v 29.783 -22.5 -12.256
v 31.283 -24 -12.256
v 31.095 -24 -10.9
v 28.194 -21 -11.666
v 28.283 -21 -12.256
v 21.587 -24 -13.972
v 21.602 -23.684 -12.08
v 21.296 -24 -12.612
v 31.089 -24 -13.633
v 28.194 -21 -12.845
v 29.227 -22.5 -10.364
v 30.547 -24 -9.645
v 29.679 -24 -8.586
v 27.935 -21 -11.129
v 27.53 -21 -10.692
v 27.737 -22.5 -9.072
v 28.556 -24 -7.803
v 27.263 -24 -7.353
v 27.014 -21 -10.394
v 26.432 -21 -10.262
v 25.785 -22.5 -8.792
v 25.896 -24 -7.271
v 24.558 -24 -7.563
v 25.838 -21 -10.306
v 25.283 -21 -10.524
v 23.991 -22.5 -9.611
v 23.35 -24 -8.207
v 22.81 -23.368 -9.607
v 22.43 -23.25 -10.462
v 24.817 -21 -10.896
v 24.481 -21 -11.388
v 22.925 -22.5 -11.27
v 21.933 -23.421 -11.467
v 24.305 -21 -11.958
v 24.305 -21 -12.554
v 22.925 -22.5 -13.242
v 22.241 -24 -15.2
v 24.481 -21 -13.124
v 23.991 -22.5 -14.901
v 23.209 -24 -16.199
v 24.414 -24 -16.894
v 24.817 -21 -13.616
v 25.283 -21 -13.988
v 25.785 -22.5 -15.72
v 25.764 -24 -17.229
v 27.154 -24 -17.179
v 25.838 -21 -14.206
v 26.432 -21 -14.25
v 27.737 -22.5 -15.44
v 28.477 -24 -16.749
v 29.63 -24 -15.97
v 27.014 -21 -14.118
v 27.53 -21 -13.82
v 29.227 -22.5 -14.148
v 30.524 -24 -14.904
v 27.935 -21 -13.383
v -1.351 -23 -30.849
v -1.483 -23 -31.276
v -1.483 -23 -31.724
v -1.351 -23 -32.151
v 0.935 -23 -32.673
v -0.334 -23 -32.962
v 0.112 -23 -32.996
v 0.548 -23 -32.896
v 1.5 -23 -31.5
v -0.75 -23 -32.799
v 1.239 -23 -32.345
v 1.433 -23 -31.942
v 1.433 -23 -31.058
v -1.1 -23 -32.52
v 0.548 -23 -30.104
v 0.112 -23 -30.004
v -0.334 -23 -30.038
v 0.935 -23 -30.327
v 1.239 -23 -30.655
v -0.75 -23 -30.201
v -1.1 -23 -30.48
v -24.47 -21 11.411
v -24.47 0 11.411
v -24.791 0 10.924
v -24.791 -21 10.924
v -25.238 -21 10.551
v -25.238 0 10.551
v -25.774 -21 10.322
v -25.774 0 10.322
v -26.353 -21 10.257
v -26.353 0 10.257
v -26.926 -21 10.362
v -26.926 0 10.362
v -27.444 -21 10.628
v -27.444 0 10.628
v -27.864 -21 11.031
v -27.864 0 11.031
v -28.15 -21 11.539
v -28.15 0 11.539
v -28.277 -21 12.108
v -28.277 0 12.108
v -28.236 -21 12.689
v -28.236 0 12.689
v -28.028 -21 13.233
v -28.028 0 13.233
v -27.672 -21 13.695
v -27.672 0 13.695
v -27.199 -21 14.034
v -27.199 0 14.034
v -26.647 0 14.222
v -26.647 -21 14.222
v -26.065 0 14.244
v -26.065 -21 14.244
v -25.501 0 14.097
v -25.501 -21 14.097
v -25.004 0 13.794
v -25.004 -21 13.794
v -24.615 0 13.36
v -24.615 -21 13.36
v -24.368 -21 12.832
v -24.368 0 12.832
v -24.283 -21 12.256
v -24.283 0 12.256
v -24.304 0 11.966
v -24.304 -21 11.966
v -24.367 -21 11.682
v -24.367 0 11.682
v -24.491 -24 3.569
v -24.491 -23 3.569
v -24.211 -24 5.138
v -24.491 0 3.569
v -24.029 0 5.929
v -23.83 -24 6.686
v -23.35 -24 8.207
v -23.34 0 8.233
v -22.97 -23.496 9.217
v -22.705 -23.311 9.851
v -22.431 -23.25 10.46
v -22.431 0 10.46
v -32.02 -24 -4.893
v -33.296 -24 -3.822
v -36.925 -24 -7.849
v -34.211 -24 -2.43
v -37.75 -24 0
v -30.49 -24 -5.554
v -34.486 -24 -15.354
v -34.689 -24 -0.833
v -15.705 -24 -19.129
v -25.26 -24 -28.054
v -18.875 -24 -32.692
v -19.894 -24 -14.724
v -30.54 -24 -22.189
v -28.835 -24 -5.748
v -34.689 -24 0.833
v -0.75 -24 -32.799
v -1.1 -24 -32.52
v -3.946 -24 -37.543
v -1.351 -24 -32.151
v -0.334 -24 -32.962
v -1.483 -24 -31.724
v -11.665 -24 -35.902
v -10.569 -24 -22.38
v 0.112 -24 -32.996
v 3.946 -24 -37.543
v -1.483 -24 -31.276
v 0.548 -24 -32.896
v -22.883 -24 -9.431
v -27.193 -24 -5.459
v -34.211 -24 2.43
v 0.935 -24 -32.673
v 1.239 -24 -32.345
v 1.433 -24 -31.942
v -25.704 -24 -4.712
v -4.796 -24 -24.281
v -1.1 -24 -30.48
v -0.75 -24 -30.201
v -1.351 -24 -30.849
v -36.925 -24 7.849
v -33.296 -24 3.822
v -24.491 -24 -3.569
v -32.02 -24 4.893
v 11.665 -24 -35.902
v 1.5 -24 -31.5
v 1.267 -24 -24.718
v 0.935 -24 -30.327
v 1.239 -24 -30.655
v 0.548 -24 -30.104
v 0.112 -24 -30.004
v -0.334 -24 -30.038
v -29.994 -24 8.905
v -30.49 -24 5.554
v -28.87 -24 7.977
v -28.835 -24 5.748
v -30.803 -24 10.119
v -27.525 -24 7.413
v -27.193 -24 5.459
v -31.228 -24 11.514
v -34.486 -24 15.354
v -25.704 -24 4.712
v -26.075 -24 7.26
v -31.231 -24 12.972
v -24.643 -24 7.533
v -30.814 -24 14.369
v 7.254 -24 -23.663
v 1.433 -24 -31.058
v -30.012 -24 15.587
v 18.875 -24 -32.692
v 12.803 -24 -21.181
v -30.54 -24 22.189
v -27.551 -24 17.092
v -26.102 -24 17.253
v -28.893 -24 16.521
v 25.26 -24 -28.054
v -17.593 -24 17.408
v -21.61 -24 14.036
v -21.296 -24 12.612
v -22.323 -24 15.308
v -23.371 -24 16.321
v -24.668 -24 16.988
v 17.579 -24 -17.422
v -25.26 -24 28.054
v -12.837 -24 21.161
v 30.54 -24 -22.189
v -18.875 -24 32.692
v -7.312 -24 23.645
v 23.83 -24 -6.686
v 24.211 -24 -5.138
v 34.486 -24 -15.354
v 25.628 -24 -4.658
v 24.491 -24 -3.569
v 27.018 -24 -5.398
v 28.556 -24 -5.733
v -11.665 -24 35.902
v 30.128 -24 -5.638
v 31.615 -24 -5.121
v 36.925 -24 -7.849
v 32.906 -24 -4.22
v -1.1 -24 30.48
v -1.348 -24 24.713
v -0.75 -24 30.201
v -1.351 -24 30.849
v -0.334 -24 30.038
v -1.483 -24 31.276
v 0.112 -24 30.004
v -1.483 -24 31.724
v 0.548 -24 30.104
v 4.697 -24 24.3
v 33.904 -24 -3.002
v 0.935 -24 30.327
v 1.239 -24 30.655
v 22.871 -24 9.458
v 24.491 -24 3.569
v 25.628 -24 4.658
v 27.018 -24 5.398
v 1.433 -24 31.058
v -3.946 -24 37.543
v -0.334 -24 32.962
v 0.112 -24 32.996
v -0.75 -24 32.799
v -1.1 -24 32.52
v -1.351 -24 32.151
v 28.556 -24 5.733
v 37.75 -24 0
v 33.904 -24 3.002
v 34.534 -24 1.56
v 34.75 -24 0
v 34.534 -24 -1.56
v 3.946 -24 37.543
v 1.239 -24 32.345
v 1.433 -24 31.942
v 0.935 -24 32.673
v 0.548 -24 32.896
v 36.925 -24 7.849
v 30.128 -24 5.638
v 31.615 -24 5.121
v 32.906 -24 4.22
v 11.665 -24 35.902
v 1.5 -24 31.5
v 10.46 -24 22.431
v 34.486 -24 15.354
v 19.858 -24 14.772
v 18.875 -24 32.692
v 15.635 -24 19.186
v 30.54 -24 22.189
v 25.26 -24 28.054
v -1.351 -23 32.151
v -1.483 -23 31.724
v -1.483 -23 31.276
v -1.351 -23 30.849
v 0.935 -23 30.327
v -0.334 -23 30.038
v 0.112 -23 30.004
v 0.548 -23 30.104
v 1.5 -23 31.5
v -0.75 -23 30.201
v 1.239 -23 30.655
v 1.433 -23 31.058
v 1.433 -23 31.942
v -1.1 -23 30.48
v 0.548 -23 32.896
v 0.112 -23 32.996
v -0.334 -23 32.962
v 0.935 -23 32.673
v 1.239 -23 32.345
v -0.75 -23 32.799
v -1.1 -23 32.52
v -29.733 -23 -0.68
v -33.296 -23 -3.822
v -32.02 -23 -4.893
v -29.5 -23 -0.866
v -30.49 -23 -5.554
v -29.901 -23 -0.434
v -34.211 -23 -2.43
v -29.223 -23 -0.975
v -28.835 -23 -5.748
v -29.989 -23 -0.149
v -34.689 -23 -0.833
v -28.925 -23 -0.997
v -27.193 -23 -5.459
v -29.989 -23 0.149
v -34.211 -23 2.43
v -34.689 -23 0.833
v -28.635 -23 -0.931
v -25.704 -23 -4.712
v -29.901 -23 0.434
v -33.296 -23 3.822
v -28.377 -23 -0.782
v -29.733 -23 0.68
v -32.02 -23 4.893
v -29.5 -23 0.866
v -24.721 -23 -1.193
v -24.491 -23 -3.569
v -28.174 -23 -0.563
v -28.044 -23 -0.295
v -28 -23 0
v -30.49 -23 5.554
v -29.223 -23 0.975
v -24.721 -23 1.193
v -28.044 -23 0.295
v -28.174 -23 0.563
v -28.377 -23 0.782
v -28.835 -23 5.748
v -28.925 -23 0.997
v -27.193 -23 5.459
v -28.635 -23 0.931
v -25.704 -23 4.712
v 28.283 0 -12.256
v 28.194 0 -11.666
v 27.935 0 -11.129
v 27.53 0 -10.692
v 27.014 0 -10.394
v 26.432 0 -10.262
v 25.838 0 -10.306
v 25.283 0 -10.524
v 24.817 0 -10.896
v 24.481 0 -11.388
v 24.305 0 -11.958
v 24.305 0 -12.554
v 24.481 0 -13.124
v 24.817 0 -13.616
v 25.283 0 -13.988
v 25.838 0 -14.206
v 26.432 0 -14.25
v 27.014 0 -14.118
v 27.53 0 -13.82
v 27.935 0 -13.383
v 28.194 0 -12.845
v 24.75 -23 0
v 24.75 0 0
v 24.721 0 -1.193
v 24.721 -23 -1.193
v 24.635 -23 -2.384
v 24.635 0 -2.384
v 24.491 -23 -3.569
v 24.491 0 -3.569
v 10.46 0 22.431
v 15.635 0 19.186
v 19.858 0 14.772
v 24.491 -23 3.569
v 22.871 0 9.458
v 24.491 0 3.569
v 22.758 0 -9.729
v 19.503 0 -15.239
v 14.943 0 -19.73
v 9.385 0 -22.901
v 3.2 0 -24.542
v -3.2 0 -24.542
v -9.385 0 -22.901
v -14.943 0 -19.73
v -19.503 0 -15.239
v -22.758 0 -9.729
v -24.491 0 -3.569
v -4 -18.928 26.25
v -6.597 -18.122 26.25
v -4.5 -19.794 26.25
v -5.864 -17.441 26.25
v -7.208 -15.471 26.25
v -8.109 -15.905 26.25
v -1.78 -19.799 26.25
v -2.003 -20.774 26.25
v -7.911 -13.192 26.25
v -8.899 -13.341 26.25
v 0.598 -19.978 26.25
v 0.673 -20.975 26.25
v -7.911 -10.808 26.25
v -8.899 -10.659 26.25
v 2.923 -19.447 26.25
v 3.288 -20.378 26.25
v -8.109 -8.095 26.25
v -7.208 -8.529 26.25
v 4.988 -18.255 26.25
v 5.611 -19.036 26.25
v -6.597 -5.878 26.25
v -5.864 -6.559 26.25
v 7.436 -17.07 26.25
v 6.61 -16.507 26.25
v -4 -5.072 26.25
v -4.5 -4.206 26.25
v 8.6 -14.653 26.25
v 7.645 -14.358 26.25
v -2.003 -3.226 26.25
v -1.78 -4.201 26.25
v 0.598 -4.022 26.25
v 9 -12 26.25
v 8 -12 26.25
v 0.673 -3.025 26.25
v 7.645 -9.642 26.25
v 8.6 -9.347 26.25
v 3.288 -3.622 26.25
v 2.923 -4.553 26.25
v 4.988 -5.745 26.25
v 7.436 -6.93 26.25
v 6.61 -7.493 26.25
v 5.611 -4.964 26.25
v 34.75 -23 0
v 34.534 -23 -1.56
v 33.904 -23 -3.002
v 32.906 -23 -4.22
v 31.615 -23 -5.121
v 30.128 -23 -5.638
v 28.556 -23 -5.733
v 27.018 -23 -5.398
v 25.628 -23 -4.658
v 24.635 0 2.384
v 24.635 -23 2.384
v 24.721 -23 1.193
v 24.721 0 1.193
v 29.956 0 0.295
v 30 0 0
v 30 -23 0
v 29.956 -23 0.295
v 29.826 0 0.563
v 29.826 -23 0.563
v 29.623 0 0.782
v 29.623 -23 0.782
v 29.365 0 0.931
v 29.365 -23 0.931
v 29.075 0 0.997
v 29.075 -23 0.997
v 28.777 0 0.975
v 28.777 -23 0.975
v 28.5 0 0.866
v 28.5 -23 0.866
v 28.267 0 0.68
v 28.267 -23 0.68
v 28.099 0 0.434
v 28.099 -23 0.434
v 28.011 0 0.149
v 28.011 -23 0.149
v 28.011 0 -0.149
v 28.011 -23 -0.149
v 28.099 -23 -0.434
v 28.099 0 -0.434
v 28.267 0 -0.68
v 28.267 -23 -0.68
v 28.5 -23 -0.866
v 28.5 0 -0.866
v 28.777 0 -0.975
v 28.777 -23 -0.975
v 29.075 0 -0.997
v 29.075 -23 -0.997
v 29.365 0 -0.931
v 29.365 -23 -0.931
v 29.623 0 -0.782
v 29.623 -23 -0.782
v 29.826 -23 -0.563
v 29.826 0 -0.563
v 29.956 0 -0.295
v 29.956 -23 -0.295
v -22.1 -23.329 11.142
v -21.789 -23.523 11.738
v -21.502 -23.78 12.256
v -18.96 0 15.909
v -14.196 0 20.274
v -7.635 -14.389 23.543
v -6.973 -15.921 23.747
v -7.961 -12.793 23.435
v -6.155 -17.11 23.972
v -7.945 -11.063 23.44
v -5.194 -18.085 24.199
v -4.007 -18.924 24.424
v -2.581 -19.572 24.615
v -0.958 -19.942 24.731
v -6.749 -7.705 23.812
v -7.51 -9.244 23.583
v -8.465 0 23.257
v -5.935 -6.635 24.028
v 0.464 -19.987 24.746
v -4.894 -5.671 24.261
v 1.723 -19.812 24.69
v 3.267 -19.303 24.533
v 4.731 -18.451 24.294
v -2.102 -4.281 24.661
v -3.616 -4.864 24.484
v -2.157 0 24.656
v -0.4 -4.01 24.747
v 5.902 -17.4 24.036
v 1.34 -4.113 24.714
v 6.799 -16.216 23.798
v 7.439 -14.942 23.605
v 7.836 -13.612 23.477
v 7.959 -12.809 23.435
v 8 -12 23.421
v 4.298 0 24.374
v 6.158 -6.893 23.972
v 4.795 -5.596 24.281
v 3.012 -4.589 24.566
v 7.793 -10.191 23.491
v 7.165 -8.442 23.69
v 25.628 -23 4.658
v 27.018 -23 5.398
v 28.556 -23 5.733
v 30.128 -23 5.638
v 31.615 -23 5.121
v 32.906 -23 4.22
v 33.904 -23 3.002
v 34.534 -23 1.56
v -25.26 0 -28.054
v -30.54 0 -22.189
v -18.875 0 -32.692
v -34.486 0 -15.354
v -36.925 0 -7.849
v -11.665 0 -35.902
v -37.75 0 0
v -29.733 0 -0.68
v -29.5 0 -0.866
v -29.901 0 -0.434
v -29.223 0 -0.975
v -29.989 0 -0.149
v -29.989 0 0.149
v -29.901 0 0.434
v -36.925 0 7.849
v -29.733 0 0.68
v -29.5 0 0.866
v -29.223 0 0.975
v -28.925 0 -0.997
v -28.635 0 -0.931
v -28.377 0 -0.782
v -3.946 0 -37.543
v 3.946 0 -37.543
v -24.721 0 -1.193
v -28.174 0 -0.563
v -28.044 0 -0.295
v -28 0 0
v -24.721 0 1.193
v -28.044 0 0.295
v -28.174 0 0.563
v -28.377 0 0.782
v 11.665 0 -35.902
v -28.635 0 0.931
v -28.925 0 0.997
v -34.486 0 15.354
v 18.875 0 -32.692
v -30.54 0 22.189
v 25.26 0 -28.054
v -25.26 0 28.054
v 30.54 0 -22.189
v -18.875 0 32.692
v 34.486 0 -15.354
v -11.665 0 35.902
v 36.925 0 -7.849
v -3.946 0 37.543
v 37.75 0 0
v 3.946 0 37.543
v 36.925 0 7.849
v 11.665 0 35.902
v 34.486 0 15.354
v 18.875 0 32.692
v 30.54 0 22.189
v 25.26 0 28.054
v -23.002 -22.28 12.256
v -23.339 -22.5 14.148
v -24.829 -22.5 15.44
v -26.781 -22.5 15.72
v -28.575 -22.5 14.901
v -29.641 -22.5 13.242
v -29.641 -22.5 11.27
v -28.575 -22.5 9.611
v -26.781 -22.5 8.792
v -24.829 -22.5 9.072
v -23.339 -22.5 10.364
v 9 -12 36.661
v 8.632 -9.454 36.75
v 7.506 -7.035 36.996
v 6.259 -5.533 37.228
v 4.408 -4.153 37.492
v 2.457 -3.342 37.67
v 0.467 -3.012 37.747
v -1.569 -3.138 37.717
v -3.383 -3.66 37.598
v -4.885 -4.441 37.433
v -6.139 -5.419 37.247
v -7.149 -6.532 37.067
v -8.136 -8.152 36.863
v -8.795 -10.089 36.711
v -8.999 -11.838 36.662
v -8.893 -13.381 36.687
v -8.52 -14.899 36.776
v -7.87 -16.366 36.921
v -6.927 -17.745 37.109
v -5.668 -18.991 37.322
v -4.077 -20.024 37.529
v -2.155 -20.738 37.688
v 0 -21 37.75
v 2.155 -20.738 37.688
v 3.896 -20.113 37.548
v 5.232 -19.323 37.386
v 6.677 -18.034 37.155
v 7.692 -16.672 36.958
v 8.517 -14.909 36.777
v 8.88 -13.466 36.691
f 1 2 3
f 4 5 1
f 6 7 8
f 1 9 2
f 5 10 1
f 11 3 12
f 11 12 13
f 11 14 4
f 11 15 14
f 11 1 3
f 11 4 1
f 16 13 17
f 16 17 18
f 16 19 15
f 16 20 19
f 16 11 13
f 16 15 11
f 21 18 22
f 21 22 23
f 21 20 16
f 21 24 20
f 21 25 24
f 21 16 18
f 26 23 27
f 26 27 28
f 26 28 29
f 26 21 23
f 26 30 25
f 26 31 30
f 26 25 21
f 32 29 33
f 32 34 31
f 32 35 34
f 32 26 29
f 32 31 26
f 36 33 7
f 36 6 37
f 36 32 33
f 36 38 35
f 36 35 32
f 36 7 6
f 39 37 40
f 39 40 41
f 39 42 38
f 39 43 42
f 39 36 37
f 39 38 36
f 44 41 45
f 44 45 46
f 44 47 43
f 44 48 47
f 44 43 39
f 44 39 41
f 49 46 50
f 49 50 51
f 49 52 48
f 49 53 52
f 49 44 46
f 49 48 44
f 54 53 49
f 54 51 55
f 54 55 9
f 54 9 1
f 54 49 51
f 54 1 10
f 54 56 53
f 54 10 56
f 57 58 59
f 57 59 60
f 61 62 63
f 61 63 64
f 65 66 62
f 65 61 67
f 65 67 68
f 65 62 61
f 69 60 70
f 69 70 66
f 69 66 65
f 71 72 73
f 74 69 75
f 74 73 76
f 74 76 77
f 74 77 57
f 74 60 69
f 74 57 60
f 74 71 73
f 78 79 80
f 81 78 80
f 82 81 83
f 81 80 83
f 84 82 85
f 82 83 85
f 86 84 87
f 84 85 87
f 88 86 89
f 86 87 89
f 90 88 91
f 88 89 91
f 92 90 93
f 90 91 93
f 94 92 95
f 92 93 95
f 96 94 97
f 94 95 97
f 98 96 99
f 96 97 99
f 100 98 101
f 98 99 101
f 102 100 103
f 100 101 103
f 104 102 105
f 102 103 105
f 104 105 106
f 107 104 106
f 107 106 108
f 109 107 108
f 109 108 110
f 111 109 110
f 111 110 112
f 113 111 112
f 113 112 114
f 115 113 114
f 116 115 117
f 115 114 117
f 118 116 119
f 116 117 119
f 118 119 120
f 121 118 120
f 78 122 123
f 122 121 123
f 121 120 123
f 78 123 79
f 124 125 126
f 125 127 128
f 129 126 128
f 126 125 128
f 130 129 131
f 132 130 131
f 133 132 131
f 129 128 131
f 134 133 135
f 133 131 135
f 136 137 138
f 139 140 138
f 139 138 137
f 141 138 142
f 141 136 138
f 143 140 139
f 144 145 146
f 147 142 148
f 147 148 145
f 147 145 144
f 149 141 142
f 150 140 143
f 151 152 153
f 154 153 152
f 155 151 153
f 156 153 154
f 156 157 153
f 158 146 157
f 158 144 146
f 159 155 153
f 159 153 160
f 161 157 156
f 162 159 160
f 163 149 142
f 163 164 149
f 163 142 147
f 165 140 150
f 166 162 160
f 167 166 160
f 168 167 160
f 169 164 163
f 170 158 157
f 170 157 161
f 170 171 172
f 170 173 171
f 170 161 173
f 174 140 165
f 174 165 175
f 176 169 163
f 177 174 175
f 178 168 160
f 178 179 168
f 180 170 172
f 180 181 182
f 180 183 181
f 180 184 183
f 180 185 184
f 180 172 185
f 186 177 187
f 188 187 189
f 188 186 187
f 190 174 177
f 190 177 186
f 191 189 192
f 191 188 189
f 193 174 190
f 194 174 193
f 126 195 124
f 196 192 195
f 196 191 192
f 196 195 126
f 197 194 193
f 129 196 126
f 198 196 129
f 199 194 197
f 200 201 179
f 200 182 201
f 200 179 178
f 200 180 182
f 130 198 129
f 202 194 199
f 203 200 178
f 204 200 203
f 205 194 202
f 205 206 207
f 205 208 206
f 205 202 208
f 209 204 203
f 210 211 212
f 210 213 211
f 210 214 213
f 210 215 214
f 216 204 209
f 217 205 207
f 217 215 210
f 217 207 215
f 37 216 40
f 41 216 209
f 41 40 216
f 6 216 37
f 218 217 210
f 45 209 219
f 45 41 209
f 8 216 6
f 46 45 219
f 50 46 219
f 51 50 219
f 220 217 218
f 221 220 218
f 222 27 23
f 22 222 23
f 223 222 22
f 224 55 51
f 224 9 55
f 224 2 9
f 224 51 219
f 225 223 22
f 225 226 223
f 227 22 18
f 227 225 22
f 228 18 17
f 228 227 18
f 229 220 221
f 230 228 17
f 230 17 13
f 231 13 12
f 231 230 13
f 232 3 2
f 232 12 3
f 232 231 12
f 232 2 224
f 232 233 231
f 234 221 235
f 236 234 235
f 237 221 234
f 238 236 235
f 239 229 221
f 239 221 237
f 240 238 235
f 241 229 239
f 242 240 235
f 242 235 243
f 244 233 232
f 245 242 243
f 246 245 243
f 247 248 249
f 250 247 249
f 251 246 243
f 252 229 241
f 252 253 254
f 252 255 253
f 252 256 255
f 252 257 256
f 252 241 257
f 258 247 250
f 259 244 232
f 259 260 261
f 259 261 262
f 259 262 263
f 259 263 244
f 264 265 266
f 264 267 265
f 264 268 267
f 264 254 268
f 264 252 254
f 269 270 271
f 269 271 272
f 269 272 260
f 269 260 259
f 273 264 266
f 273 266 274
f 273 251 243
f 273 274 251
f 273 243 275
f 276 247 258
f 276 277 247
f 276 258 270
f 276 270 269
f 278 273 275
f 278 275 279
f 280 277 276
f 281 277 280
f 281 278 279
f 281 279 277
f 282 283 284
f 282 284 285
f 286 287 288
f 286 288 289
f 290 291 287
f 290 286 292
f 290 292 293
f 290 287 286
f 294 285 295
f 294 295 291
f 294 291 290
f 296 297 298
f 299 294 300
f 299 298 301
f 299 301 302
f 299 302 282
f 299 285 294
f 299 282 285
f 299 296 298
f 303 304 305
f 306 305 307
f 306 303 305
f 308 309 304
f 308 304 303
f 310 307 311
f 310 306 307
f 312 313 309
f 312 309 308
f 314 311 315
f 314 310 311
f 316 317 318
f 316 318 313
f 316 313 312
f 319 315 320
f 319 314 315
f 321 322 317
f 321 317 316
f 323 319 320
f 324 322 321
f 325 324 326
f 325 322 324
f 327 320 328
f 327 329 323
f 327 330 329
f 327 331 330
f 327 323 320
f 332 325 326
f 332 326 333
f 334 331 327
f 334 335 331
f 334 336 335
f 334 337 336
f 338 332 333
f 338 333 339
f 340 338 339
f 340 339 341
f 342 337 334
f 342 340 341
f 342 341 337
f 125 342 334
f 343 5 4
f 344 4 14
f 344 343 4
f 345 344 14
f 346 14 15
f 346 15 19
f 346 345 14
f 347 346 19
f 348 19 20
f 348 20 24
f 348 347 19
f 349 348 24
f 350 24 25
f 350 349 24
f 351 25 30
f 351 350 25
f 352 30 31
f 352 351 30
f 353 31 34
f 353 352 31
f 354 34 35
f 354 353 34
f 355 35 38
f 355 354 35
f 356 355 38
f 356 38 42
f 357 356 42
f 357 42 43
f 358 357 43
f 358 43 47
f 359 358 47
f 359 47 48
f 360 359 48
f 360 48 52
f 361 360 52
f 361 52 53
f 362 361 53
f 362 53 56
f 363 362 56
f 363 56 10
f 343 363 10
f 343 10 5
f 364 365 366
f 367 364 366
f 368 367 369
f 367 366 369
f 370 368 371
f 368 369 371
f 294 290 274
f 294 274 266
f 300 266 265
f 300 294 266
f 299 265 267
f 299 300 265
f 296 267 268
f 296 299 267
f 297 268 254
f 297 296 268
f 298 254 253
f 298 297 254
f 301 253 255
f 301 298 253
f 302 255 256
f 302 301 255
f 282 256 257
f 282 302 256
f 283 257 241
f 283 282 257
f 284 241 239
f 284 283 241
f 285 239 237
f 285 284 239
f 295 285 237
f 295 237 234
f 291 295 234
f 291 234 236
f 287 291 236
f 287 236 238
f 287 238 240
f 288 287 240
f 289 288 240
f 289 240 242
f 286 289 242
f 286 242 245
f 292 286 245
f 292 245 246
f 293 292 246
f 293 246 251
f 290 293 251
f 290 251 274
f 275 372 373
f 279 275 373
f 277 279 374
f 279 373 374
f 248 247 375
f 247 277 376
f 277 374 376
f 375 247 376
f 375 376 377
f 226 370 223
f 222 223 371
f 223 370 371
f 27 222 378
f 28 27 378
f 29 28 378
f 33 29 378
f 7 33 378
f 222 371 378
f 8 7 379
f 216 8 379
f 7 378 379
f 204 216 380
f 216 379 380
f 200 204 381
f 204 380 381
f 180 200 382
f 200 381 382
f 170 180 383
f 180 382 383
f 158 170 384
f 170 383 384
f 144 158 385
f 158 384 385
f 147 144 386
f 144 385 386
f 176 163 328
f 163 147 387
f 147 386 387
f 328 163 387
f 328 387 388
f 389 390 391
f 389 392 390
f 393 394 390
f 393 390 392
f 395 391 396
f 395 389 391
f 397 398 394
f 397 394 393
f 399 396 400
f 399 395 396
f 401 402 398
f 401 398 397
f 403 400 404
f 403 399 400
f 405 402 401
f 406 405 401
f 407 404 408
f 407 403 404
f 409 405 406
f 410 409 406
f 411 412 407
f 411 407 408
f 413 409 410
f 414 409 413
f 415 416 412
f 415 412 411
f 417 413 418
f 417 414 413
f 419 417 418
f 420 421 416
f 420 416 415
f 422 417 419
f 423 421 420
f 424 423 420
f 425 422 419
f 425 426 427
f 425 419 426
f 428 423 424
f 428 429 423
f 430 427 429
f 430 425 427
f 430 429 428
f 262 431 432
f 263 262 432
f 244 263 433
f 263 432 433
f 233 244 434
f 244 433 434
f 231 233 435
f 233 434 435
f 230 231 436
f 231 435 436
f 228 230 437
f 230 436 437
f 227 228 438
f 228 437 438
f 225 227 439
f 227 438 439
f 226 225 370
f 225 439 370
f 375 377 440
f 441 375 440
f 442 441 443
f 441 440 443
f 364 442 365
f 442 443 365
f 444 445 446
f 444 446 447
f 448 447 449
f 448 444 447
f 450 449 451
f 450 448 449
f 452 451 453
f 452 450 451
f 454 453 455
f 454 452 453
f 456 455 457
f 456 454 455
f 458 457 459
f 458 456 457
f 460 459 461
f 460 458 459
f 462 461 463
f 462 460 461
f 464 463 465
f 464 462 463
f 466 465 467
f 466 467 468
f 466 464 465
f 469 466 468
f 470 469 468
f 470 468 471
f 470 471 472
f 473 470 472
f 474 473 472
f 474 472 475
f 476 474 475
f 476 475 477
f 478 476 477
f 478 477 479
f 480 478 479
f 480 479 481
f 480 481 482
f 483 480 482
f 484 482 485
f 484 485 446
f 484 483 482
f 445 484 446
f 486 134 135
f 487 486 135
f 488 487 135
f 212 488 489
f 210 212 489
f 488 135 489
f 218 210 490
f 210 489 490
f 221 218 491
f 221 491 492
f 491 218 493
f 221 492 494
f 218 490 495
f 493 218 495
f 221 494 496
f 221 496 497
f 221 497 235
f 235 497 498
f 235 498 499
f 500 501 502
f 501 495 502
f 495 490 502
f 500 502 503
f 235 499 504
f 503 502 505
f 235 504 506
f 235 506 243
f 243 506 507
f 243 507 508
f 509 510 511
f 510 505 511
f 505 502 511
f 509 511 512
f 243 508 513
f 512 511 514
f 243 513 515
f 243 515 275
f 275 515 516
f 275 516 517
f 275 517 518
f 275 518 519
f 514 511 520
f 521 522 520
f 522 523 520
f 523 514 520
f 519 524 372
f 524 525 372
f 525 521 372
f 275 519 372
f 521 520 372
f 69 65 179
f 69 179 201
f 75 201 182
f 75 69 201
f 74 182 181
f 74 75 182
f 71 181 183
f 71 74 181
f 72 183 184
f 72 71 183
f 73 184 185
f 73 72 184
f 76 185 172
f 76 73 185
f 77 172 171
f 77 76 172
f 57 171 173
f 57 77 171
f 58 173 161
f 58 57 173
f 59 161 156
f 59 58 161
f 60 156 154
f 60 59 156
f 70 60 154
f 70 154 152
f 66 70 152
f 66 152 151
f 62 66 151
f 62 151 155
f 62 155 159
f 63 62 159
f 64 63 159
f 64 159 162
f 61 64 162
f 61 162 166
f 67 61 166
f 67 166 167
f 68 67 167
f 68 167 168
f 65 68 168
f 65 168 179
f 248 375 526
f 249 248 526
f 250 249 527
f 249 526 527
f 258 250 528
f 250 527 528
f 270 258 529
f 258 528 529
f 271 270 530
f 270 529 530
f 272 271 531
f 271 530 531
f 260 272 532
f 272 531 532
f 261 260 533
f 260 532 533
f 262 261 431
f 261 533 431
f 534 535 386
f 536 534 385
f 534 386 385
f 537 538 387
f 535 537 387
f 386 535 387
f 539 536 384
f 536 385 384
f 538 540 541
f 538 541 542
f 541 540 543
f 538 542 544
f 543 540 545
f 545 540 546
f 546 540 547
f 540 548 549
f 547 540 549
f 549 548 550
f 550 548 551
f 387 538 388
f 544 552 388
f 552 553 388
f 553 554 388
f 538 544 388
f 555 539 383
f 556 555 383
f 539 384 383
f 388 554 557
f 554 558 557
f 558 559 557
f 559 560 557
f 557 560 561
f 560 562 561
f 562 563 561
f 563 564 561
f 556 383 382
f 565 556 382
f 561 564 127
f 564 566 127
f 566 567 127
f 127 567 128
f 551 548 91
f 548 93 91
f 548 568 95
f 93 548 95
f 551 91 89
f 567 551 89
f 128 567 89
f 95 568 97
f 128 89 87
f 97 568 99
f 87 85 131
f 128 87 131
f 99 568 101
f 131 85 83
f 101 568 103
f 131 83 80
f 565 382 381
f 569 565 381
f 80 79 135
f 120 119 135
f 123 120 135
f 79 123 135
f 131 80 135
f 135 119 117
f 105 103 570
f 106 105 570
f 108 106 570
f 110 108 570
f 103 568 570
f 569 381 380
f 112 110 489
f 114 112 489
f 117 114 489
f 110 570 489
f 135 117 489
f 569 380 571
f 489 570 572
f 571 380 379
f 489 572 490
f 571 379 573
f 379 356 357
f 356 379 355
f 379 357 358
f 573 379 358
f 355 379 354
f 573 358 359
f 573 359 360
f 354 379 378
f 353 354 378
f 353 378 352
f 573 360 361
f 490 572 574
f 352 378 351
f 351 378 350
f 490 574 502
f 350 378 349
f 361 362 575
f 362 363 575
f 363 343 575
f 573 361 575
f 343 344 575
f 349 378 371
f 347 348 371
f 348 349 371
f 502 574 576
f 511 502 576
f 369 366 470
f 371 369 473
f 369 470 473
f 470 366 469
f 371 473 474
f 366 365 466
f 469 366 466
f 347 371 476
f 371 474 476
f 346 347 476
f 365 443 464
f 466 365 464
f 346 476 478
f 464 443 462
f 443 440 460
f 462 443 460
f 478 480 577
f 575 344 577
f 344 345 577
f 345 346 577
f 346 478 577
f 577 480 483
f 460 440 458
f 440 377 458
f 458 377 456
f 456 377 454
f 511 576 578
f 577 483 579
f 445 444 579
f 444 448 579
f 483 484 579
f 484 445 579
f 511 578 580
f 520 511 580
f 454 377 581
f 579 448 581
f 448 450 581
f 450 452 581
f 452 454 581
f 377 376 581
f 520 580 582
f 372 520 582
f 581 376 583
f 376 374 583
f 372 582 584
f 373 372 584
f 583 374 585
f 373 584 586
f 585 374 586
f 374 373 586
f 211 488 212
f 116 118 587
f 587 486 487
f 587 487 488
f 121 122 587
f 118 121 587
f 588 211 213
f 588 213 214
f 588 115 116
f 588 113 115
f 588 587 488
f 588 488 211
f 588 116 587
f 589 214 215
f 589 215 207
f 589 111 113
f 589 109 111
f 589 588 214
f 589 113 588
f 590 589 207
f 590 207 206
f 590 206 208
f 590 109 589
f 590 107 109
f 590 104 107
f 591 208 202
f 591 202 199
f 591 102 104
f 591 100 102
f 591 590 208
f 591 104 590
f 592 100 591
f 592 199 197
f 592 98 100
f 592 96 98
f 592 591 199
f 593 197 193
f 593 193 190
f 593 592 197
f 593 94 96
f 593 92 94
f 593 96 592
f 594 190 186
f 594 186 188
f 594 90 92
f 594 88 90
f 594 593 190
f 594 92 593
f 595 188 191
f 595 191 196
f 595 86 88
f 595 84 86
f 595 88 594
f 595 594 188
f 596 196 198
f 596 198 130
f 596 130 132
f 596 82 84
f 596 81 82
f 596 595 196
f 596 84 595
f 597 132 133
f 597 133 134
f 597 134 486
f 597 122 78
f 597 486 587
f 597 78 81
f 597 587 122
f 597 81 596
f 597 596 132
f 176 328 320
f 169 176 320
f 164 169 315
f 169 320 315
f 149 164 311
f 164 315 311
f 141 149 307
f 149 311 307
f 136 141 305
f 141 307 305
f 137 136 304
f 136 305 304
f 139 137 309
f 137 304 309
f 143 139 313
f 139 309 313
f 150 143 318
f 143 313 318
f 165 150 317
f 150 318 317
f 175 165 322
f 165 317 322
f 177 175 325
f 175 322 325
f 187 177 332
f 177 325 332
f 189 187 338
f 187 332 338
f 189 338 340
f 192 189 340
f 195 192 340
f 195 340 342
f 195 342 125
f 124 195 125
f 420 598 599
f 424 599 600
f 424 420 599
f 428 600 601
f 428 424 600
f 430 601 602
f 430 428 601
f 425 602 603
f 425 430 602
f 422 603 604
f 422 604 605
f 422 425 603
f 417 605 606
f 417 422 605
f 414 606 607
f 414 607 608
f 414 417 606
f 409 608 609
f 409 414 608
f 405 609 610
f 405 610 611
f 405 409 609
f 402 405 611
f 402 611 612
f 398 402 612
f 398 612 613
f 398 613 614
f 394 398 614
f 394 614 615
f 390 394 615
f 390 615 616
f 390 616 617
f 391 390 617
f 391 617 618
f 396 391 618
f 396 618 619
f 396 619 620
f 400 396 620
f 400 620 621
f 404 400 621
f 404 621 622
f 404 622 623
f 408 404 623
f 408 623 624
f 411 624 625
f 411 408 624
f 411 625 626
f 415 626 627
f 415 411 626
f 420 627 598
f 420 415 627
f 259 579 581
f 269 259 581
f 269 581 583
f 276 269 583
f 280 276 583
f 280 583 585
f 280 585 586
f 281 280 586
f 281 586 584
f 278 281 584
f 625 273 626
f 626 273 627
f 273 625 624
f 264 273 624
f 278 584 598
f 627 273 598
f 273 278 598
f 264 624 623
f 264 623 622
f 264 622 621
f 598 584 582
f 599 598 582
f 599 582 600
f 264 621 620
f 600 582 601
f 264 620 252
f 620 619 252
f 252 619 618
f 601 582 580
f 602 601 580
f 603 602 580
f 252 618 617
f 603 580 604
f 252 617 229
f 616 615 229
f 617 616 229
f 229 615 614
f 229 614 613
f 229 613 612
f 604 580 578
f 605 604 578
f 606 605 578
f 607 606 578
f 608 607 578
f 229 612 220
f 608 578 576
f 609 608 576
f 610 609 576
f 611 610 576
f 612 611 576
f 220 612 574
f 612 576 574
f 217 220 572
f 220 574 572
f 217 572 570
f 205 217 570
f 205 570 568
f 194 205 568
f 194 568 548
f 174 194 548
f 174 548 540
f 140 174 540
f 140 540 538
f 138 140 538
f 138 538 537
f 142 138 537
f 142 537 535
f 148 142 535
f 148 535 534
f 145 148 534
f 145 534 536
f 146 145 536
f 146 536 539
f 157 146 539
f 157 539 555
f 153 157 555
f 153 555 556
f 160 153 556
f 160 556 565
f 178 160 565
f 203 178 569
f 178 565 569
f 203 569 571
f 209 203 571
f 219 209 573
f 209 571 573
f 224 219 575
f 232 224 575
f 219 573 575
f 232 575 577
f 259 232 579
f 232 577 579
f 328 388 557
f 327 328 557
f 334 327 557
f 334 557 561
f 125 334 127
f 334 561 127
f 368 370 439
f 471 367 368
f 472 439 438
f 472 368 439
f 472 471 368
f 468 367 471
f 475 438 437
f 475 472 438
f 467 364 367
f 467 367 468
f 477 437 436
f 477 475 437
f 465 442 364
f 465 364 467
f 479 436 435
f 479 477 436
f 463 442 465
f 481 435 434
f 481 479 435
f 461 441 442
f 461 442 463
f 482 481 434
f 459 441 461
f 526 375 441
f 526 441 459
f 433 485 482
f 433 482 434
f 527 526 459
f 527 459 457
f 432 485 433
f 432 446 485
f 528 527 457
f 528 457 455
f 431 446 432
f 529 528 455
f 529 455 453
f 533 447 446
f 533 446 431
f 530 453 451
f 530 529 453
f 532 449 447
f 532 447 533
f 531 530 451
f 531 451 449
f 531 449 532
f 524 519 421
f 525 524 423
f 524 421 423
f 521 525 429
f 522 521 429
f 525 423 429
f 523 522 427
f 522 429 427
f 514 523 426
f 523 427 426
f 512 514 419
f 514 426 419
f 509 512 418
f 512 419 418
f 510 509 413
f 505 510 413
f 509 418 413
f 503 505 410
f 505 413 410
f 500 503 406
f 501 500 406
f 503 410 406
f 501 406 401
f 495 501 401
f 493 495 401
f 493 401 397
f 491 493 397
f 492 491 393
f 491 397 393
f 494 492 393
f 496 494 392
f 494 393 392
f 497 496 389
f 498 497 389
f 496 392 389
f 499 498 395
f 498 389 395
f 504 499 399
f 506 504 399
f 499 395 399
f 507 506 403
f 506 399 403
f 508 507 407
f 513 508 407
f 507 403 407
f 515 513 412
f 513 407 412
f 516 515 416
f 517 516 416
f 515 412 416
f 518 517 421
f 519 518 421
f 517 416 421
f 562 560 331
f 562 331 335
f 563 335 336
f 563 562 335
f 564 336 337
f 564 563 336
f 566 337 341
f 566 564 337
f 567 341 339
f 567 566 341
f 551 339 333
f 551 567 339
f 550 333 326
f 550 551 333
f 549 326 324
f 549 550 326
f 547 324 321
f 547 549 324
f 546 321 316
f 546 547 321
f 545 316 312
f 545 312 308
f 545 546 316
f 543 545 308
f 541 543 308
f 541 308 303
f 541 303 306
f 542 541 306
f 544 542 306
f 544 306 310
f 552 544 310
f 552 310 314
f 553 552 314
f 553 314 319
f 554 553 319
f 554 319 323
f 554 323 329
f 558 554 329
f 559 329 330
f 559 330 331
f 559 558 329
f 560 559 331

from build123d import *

# Parameters (mm, degrees)
F0_R     = 37.75
F0_R_2   = 1.5
F0_R_3   = 2
F1_DEPTH = 24
F0_R_4   = 1
F2_DEPTH = 23
F5_R     = 9
F5_R_2   = 8
F6_DEPTH = 25
F7_DEPTH = 15


# Not quite as in the source:
# - a fillet or chamfer that OpenCascade refuses, or shapes differently, is made with other operations: its cross-section is extruded or revolved along the edge and cut away or added


with BuildPart() as f1:
    # F0 (on Front) → F1 (new body)
    with BuildSketch(Plane.XZ):
        Circle(F0_R)
        with Locations((0, -31.5)):
            Circle(F0_R_2, mode=Mode.SUBTRACT)
        with Locations((26.2829258241, -12.2559295905)):
            Circle(F0_R_3, mode=Mode.SUBTRACT)
        with BuildLine():
            ThreePointArc((-24.2829258241, 12.2559295905), (-24.3303338098, 11.8230503626), (-24.47031025, 11.410693067))
            ThreePointArc((-24.47031025, 11.410693067), (-28.2355178383, 12.6888088184), (-24.2829258241, 12.2559295905))
        make_face(mode=Mode.SUBTRACT)
        with BuildLine():
            ThreePointArc((10.4598019781, 22.4311177292), (19.8581217638, 14.7721867038), (24.4913793103, 3.568590685))
            ThreePointArc((24.4913793103, 3.568590685), (30.8891705898, 5.4307950139), (34.75, 0))
            ThreePointArc((34.75, 0), (30.8891705898, -5.4307950139), (24.4913793103, -3.568590685))
            ThreePointArc((24.4913793103, -3.568590685), (0, -24.75), (-24.4913793103, -3.568590685))
            ThreePointArc((-24.4913793103, -3.568590685), (-34.75, 0), (-24.4913793103, 3.568590685))
            ThreePointArc((-24.4913793103, 3.568590685), (-23.7129158978, 7.0894371866), (-22.4311177292, 10.4598019781))
            ThreePointArc((-22.4311177292, 10.4598019781), (-8.4649985473, 23.2573923645), (10.4598019781, 22.4311177292))
        make_face(mode=Mode.SUBTRACT)
        with Locations((0, 31.5)):
            Circle(F0_R_2, mode=Mode.SUBTRACT)
    extrude(amount=F1_DEPTH)

    # F0 (on Front) → F2 (join)
    with BuildSketch(Plane.XZ):
        with BuildLine():
            ThreePointArc((-24.4913793103, 3.568590685), (-34.75, 0), (-24.4913793103, -3.568590685))
            ThreePointArc((-24.4913793103, -3.568590685), (-24.75, 0), (-24.4913793103, 3.568590685))
        make_face()
        with Locations((-29, 0)):
            Circle(F0_R_4, mode=Mode.SUBTRACT)
        with Locations((0, 31.5)):
            Circle(F0_R_2)
        with BuildLine():
            ThreePointArc((24.4913793103, 3.568590685), (24.6852601559, 1.7889748557), (24.75, 0))
            ThreePointArc((24.75, 0), (24.6852601559, -1.7889748557), (24.4913793103, -3.568590685))
            ThreePointArc((24.4913793103, -3.568590685), (30.8891705898, -5.4307950139), (34.75, 0))
            ThreePointArc((34.75, 0), (30.8891705898, 5.4307950139), (24.4913793103, 3.568590685))
        make_face()
        with Locations((29, 0)):
            Circle(F0_R_4, mode=Mode.SUBTRACT)
        with Locations((0, -31.5)):
            Circle(F0_R_2)
    extrude(amount=F2_DEPTH)

    # F3: chamfer of 3 on 2 edges, made by hand

    # F3_s1 → F3_t2 (revolve, cut)
    with BuildSketch(Plane.XY.offset(12.2559295905)):
        Polygon((-21.2829258241, -24), (-24.2829258241, -21), (-24.2829258241, -24), align=None)
    revolve(axis=Axis((-26.2829258241, -24, 12.2559295905), (0, -1, 0)), mode=Mode.SUBTRACT)

    # F3_s3 → F3_t4 (revolve, cut)
    with BuildSketch(Plane.XY.offset(-12.2559295905)):
        Polygon((31.2829258241, -24), (28.2829258241, -21), (28.2829258241, -24), align=None)
    revolve(axis=Axis((26.2829258241, -24, -12.2559295905), (0, -1, 0)), mode=Mode.SUBTRACT)

    # F5 (on offset) → F6 (cut)
    with BuildSketch(Plane.XY.offset(26.25)):
        with Locations((0, -12)):
            Circle(F5_R)
        with Locations((0, -12)):
            Circle(F5_R_2, mode=Mode.SUBTRACT)
    extrude(amount=F6_DEPTH, mode=Mode.SUBTRACT)

    # F5 (on offset) → F7 (cut, symmetric)
    with BuildSketch(Plane.XY.offset(26.25)):
        with Locations((0, -12)):
            Circle(F5_R_2)
    extrude(amount=F7_DEPTH, both=True, mode=Mode.SUBTRACT)


solid = f1.part
